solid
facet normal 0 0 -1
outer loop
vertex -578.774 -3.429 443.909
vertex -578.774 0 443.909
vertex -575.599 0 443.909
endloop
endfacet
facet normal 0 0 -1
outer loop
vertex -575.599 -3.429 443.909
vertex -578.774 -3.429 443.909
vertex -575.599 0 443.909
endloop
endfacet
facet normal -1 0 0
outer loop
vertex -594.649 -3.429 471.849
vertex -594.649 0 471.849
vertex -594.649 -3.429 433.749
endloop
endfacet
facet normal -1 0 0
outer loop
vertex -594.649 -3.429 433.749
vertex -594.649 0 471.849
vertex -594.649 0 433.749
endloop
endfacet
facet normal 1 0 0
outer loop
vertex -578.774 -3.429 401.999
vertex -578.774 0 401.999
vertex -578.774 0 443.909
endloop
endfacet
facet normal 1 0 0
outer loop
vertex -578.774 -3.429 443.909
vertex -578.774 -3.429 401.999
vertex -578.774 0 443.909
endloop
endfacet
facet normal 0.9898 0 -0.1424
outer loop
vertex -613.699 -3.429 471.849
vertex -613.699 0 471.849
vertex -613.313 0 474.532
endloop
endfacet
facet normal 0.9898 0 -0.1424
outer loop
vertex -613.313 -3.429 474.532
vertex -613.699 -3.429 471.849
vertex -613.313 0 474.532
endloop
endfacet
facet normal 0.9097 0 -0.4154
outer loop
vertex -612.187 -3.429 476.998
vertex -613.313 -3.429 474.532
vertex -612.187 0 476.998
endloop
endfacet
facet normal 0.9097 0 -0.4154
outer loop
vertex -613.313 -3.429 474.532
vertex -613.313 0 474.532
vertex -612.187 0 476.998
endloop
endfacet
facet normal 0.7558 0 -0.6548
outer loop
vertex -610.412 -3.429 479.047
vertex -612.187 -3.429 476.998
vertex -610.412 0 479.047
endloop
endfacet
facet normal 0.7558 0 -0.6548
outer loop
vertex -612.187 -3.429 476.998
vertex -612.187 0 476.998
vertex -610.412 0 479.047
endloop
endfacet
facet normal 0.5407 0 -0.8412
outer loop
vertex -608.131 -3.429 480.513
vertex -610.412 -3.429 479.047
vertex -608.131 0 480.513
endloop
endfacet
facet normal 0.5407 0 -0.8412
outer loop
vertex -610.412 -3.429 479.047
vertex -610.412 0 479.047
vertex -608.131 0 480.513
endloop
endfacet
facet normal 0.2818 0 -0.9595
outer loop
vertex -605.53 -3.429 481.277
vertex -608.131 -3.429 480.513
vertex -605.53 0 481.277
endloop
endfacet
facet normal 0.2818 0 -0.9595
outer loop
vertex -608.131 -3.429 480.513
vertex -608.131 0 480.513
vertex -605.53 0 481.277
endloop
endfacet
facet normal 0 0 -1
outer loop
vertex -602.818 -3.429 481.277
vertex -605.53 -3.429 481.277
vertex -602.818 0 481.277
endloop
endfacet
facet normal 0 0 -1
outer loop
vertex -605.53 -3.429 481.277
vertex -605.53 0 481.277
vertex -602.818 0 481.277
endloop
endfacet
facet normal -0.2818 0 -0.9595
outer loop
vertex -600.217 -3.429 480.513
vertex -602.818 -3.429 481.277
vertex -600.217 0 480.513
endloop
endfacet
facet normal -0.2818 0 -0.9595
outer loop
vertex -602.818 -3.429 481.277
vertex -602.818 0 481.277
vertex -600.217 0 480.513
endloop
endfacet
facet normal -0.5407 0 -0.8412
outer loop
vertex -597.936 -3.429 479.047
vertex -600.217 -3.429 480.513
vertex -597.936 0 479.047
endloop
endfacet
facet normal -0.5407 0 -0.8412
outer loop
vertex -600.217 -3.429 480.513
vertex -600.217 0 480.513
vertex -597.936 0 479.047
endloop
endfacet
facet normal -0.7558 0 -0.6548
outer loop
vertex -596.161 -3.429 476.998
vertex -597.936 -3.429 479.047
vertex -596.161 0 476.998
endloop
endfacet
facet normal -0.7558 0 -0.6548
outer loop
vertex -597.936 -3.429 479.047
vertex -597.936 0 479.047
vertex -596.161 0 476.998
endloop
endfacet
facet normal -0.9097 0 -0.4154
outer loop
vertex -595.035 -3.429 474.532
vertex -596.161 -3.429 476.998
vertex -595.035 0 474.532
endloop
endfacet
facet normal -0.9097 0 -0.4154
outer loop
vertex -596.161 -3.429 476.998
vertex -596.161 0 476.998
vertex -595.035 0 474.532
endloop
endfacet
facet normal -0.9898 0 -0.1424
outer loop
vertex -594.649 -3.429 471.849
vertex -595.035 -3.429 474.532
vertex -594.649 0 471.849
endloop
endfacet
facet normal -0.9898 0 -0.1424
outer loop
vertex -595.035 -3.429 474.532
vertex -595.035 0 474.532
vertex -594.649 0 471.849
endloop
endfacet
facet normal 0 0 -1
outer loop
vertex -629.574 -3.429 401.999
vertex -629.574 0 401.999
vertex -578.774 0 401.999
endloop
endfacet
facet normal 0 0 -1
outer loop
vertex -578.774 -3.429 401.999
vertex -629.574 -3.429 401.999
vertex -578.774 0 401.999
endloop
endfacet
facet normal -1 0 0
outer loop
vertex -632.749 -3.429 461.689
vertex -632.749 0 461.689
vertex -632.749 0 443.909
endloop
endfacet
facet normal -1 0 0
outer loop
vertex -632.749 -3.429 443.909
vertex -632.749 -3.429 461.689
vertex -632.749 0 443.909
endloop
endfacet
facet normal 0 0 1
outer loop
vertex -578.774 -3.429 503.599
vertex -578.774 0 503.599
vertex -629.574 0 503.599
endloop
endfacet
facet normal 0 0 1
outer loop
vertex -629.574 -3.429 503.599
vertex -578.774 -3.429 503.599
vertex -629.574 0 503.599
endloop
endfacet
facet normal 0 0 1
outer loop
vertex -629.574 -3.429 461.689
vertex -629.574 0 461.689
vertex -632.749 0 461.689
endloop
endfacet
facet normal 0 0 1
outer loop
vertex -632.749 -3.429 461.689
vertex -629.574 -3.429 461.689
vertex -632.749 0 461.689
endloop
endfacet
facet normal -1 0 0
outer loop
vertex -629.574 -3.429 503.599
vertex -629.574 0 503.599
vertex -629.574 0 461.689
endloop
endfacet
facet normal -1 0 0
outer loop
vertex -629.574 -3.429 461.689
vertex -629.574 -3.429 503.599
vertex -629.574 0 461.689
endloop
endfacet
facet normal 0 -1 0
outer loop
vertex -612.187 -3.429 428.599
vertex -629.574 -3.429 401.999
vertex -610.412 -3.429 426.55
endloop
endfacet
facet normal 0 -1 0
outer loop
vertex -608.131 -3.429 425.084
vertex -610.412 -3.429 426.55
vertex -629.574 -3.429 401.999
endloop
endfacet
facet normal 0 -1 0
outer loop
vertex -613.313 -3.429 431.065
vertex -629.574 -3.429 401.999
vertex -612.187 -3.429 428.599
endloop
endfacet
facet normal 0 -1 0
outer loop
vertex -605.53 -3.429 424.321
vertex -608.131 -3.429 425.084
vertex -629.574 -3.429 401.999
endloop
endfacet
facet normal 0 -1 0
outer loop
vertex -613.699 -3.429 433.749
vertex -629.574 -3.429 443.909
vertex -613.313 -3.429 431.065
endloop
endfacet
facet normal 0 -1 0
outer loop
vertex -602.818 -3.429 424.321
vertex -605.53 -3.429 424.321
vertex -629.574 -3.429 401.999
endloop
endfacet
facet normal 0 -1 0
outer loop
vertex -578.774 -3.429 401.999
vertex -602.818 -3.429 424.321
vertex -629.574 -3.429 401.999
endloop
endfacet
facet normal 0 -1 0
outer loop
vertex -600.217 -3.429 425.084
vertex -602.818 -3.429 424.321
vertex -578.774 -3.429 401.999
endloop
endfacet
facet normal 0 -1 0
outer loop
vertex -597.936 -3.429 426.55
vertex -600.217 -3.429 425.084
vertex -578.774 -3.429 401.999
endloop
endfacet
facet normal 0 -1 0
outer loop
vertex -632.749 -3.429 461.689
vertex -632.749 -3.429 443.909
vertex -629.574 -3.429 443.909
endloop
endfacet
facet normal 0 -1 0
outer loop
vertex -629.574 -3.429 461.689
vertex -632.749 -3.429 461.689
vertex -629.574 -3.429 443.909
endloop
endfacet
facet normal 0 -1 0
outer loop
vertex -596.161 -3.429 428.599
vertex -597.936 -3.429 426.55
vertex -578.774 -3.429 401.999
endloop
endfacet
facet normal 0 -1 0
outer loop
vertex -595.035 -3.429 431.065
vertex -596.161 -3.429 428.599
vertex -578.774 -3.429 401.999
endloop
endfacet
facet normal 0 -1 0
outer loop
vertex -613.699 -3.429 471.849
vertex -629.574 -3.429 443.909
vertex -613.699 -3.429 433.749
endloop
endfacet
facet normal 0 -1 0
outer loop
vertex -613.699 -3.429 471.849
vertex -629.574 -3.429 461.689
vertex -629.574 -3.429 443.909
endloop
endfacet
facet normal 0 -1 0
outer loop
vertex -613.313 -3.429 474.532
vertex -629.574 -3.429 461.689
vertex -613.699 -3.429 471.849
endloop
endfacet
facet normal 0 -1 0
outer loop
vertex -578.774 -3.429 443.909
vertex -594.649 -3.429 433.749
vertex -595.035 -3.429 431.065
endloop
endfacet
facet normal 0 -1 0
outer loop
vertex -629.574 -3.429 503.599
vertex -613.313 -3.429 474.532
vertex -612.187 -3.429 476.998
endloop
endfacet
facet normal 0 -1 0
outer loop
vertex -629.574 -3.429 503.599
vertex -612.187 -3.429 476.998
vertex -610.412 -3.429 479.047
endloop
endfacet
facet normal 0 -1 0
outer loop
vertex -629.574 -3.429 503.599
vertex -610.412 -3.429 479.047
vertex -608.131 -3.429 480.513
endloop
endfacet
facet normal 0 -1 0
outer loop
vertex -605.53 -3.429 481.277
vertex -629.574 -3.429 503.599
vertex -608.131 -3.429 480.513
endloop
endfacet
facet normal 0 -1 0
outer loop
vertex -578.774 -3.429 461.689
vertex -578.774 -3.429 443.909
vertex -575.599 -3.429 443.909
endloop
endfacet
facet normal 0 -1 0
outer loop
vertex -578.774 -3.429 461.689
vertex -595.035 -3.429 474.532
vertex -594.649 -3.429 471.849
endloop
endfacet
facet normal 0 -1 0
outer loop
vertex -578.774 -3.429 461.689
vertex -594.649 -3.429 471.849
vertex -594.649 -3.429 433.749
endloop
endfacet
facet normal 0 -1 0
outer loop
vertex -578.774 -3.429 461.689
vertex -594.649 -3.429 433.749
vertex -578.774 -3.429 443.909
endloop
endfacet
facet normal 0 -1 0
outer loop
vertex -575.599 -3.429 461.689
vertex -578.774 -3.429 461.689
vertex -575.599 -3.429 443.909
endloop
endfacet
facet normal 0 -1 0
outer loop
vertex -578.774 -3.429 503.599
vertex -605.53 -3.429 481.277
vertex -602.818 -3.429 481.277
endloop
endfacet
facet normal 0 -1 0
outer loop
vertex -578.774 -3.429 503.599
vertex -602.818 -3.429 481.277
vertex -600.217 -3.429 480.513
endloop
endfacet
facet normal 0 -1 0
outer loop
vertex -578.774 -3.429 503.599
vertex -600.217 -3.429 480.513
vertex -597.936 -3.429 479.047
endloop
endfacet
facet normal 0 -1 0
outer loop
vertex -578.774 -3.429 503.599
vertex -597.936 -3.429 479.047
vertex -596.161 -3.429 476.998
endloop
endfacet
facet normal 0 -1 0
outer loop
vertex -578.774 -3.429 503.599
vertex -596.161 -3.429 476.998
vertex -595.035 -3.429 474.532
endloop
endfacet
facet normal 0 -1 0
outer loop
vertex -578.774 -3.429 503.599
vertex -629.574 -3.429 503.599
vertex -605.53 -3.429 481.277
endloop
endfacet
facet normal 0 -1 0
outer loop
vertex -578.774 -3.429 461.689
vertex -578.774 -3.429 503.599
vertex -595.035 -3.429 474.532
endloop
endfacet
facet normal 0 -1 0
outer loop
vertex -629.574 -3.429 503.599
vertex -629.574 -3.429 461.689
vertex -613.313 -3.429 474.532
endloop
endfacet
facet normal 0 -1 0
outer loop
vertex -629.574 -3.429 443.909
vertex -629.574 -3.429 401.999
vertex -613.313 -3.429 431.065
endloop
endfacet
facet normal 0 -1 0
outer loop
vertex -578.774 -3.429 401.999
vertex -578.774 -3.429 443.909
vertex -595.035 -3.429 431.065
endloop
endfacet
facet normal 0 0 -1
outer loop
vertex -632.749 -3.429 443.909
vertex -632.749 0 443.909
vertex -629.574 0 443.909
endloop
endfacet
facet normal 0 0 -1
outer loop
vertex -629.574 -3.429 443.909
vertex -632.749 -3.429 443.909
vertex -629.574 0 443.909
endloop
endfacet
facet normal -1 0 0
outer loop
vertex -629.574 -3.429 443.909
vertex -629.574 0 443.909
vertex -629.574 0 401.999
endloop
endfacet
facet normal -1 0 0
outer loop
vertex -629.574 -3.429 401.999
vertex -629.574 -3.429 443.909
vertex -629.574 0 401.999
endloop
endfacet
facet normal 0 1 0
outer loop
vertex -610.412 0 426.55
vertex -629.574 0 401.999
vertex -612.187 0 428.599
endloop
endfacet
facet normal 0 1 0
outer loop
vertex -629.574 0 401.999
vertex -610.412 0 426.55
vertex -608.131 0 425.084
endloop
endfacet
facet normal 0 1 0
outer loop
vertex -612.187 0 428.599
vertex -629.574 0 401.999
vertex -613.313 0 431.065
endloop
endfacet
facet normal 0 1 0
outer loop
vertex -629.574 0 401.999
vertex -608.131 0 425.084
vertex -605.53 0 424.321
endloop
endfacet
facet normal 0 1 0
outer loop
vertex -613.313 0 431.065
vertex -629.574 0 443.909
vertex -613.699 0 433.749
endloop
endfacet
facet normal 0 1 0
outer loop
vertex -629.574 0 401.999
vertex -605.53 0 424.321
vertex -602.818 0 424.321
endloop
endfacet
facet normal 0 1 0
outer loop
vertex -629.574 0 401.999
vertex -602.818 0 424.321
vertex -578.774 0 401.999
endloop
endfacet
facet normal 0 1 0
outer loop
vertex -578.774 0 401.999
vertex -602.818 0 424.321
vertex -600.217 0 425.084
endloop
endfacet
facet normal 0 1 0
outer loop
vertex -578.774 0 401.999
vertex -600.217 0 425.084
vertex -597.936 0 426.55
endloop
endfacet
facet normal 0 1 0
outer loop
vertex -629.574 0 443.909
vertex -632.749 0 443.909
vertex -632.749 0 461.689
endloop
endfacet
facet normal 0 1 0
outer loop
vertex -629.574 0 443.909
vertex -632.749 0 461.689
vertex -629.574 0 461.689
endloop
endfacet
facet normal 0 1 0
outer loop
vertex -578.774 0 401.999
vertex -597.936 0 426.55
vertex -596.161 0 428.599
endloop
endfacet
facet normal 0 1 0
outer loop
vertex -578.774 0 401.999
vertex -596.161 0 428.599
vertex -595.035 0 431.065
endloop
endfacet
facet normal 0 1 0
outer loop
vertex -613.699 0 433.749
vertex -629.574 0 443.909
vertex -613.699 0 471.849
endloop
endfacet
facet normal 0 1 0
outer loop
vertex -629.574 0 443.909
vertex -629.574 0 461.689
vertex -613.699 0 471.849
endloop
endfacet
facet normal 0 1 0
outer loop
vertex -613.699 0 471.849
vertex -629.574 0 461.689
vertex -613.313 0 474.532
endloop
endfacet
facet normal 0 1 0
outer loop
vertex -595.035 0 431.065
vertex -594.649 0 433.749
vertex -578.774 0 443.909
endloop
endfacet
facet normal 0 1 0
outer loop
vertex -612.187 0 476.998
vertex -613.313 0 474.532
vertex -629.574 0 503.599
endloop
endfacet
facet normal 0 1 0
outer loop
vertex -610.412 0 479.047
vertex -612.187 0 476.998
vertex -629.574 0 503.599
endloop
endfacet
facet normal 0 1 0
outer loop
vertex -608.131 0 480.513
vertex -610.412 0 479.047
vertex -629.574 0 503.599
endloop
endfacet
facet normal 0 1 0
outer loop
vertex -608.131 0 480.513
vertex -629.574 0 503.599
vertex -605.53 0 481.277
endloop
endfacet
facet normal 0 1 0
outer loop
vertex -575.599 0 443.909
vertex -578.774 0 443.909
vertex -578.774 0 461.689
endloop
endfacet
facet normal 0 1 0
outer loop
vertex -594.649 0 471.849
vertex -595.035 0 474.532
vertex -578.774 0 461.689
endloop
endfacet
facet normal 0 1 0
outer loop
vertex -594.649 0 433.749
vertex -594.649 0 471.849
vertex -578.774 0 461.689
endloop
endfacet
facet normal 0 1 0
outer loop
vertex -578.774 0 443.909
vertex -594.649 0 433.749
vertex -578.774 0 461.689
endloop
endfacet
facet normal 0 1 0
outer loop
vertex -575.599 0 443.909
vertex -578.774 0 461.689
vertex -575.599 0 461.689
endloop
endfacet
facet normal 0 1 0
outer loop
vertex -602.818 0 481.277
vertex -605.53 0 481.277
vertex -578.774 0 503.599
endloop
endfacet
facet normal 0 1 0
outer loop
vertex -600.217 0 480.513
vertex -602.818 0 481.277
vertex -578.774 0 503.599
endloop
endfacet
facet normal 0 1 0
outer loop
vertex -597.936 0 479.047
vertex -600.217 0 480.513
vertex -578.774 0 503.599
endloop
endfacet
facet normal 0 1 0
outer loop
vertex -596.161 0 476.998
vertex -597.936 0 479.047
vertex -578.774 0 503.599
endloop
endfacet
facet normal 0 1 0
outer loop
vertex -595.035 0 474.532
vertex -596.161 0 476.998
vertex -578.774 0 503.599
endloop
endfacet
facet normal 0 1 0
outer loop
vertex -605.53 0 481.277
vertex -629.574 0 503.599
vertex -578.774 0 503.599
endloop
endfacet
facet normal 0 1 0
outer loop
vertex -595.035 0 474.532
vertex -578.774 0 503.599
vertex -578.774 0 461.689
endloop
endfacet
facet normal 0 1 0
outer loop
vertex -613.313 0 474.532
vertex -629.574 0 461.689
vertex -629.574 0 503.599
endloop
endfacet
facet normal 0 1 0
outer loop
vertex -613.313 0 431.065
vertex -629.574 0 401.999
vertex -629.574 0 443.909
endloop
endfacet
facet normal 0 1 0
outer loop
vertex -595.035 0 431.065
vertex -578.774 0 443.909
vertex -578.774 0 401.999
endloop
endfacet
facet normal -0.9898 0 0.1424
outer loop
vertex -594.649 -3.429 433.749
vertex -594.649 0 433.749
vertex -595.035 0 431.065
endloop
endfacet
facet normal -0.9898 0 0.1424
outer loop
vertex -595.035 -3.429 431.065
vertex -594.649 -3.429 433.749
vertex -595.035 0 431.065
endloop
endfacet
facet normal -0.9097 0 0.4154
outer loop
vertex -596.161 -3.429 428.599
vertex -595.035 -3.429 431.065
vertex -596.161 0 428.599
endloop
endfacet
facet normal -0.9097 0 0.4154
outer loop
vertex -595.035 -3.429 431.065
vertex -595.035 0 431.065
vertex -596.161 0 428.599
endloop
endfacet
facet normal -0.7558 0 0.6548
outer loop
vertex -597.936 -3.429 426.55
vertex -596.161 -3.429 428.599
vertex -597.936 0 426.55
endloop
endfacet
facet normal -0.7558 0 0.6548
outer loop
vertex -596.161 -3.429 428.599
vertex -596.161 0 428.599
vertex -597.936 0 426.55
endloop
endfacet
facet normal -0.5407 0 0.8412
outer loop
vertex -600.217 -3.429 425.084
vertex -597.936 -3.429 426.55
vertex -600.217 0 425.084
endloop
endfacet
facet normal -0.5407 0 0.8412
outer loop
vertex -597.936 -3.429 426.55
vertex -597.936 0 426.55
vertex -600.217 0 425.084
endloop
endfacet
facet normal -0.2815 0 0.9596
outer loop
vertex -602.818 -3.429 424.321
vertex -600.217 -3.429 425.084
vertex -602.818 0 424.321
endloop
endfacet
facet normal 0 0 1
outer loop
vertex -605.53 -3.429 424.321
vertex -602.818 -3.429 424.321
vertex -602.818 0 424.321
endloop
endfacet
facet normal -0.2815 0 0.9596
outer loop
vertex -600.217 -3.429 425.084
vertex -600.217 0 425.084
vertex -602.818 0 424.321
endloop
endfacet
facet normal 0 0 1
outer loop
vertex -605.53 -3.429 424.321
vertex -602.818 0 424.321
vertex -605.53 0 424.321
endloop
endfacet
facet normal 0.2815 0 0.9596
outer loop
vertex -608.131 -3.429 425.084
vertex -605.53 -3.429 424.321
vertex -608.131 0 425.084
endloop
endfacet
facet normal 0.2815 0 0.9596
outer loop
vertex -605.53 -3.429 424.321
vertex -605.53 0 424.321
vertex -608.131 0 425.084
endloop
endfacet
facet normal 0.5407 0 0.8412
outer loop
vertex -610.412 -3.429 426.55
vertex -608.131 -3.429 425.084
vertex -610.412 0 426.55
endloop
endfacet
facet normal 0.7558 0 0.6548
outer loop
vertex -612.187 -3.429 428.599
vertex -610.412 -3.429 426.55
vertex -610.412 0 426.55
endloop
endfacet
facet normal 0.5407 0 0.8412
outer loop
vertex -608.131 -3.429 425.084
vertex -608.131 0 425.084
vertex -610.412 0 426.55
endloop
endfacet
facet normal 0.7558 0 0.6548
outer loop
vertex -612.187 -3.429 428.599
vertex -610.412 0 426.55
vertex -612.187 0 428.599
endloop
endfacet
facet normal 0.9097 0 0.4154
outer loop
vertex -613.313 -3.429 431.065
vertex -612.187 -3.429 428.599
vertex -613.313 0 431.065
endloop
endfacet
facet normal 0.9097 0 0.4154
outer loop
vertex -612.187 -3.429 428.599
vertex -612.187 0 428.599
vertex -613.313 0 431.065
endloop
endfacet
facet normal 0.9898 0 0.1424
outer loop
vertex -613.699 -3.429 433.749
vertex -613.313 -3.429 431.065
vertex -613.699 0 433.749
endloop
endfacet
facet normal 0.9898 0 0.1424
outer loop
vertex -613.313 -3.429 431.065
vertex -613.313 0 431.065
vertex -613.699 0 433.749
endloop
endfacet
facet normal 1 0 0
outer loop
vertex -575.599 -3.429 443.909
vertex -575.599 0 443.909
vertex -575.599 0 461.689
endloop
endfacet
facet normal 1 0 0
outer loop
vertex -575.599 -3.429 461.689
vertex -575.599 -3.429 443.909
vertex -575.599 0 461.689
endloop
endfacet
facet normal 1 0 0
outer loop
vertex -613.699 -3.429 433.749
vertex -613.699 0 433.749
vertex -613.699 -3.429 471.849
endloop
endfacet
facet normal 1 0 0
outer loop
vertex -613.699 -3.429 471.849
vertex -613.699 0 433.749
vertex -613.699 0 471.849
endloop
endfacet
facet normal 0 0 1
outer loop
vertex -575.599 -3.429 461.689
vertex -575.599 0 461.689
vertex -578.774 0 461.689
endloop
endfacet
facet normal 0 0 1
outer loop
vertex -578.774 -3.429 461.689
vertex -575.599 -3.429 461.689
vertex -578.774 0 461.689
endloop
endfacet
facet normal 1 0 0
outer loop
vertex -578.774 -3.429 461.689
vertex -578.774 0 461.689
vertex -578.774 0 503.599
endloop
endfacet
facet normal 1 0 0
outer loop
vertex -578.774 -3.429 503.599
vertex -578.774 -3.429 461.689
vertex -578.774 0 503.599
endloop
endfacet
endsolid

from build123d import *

# Parameters (mm, degrees)
F1_DEPTH = 3.429


with BuildPart() as f1:
    # F0 (on Front) → F1 (new body)
    with BuildSketch(Plane.XZ):
        Polygon((-575.599027, 443.908663), (-575.599027, 461.688663), (-578.774027, 461.688663), (-578.774027, 503.598663), (-629.574027, 503.598663), (-629.574027, 461.688663), (-632.749027, 461.688663), (-632.749027, 443.908663), (-629.574027, 443.908663), (-629.574027, 401.998663), (-578.774027, 401.998663), (-578.774027, 443.908663), align=None)
        with BuildLine():
            Line((-594.649027, 471.848663), (-594.649027, 433.748663))
            ThreePointArc((-594.649027, 433.748663), (-604.174027, 424.223663), (-613.699027, 433.748663))
            Line((-613.699027, 433.748663), (-613.699027, 471.848663))
            ThreePointArc((-613.699027, 471.848663), (-604.174027, 481.373663), (-594.649027, 471.848663))
        make_face(mode=Mode.SUBTRACT)
    extrude(amount=F1_DEPTH)


solid = f1.part
